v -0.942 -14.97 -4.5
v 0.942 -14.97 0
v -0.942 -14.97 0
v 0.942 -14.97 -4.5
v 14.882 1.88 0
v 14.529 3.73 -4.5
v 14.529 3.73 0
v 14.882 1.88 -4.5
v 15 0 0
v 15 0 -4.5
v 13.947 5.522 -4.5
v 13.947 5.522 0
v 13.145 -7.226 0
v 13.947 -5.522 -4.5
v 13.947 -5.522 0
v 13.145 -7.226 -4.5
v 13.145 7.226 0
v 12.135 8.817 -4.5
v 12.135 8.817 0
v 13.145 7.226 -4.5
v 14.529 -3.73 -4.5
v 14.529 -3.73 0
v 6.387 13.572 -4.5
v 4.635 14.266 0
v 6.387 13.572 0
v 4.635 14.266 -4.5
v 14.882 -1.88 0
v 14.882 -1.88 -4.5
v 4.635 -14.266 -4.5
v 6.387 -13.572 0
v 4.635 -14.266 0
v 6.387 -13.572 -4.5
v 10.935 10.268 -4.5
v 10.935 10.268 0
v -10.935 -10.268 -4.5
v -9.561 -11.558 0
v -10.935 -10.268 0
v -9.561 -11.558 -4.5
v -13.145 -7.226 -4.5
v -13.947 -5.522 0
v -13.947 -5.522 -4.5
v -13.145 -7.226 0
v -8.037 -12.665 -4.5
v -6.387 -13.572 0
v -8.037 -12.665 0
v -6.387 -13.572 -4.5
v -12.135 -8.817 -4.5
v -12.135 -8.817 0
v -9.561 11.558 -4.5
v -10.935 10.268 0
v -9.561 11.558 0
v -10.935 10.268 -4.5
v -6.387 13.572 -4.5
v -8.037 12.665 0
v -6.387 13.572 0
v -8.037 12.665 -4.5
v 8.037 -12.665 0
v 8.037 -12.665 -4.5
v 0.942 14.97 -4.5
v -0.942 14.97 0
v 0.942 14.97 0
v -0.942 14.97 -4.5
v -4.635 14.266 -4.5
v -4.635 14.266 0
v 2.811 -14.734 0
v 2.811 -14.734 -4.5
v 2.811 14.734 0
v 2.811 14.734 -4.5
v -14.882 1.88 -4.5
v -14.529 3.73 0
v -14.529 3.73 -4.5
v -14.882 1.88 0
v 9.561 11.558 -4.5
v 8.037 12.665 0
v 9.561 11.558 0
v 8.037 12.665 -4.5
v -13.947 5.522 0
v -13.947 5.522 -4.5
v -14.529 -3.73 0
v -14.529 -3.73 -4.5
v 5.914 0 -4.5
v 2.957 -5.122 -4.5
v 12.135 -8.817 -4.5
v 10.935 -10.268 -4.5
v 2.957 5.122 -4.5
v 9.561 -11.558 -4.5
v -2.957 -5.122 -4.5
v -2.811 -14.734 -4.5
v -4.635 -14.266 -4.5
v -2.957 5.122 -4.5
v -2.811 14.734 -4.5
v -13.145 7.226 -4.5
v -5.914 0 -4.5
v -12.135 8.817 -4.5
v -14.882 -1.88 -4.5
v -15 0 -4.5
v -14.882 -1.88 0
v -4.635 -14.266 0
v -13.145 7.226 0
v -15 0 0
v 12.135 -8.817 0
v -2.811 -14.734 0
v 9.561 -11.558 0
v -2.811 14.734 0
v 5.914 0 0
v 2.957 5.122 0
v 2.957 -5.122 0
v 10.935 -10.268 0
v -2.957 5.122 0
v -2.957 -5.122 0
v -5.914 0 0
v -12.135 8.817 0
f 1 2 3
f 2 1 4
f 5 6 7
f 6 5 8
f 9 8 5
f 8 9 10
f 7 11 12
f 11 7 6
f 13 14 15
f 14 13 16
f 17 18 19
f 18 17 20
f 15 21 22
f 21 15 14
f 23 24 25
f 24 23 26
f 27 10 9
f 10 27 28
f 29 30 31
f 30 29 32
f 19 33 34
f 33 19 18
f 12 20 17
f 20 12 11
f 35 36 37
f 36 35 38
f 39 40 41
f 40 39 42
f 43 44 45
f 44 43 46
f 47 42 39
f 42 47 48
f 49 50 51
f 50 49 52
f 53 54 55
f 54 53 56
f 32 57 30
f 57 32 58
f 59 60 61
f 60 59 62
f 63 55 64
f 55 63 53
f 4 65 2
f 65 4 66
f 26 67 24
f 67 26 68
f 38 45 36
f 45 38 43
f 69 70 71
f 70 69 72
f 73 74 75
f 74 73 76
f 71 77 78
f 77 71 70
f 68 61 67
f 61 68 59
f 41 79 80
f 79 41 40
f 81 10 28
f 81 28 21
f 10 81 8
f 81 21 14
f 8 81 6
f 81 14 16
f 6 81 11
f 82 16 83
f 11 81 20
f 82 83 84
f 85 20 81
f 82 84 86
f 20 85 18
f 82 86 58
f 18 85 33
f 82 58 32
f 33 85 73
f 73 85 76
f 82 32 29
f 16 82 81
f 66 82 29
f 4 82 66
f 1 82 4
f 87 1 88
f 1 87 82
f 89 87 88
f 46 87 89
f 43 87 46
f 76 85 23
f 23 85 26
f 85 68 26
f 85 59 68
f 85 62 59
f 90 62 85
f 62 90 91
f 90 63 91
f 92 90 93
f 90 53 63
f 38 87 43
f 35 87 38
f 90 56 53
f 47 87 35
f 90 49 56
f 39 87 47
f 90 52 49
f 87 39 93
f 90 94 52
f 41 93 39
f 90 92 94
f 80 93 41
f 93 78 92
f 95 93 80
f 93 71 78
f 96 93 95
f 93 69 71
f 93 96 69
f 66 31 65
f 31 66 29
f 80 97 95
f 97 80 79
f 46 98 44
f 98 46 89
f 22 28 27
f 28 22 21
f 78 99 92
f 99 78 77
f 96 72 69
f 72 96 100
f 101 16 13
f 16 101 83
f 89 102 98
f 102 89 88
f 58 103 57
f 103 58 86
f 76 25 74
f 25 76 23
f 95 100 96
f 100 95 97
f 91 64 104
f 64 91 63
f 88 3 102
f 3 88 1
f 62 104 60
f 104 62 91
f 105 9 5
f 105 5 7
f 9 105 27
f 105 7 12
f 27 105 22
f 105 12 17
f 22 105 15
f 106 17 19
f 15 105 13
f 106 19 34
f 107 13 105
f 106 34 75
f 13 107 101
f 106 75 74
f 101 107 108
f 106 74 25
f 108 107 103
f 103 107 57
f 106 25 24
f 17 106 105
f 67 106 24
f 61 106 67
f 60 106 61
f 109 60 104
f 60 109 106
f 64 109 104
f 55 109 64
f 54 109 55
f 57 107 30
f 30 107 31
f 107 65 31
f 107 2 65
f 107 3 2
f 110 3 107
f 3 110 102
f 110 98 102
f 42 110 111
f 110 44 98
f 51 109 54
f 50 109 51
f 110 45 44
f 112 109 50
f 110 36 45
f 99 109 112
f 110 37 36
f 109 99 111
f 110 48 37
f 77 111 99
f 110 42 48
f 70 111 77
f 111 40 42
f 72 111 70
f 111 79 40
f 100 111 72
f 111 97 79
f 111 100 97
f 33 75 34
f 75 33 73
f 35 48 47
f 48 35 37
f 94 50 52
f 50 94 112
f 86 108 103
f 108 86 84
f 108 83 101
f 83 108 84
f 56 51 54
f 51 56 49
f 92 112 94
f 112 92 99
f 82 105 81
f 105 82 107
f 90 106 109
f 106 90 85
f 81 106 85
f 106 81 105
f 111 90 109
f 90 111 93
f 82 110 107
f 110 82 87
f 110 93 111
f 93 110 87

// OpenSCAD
$fn = 50;

difference() {
	union() {
		translate(v = [0, 0, -4.5]) {
			cylinder(h = 4.5, r = 15.0);
		}
		#translate(v = [0, 0, -6.0]) {
			cylinder(h = 6, r = 2.875);
		}
	}
	union() {
		translate(v = [0, 0, 0]) {
			rotate(a = [0, 0, 0]) {
				difference() {
					union() {
						translate(v = [0, 0, -5]) {
							linear_extrude(height = 5) {
								polygon(points = [[5.914249999999999, 0.0], [2.957125, 5.1218907443321156], [-2.9571249999999982, 5.1218907443321156], [-5.914249999999999, 7.242867331857232e-16], [-2.9571250000000022, -5.121890744332115], [2.9571249999999956, -5.121890744332118]]);
							}
						}
					}
					union();
				}
			}
		}
		#translate(v = [0, 0, -100.0]) {
			cylinder(h = 200, r = 3.25);
		}
	}
}
